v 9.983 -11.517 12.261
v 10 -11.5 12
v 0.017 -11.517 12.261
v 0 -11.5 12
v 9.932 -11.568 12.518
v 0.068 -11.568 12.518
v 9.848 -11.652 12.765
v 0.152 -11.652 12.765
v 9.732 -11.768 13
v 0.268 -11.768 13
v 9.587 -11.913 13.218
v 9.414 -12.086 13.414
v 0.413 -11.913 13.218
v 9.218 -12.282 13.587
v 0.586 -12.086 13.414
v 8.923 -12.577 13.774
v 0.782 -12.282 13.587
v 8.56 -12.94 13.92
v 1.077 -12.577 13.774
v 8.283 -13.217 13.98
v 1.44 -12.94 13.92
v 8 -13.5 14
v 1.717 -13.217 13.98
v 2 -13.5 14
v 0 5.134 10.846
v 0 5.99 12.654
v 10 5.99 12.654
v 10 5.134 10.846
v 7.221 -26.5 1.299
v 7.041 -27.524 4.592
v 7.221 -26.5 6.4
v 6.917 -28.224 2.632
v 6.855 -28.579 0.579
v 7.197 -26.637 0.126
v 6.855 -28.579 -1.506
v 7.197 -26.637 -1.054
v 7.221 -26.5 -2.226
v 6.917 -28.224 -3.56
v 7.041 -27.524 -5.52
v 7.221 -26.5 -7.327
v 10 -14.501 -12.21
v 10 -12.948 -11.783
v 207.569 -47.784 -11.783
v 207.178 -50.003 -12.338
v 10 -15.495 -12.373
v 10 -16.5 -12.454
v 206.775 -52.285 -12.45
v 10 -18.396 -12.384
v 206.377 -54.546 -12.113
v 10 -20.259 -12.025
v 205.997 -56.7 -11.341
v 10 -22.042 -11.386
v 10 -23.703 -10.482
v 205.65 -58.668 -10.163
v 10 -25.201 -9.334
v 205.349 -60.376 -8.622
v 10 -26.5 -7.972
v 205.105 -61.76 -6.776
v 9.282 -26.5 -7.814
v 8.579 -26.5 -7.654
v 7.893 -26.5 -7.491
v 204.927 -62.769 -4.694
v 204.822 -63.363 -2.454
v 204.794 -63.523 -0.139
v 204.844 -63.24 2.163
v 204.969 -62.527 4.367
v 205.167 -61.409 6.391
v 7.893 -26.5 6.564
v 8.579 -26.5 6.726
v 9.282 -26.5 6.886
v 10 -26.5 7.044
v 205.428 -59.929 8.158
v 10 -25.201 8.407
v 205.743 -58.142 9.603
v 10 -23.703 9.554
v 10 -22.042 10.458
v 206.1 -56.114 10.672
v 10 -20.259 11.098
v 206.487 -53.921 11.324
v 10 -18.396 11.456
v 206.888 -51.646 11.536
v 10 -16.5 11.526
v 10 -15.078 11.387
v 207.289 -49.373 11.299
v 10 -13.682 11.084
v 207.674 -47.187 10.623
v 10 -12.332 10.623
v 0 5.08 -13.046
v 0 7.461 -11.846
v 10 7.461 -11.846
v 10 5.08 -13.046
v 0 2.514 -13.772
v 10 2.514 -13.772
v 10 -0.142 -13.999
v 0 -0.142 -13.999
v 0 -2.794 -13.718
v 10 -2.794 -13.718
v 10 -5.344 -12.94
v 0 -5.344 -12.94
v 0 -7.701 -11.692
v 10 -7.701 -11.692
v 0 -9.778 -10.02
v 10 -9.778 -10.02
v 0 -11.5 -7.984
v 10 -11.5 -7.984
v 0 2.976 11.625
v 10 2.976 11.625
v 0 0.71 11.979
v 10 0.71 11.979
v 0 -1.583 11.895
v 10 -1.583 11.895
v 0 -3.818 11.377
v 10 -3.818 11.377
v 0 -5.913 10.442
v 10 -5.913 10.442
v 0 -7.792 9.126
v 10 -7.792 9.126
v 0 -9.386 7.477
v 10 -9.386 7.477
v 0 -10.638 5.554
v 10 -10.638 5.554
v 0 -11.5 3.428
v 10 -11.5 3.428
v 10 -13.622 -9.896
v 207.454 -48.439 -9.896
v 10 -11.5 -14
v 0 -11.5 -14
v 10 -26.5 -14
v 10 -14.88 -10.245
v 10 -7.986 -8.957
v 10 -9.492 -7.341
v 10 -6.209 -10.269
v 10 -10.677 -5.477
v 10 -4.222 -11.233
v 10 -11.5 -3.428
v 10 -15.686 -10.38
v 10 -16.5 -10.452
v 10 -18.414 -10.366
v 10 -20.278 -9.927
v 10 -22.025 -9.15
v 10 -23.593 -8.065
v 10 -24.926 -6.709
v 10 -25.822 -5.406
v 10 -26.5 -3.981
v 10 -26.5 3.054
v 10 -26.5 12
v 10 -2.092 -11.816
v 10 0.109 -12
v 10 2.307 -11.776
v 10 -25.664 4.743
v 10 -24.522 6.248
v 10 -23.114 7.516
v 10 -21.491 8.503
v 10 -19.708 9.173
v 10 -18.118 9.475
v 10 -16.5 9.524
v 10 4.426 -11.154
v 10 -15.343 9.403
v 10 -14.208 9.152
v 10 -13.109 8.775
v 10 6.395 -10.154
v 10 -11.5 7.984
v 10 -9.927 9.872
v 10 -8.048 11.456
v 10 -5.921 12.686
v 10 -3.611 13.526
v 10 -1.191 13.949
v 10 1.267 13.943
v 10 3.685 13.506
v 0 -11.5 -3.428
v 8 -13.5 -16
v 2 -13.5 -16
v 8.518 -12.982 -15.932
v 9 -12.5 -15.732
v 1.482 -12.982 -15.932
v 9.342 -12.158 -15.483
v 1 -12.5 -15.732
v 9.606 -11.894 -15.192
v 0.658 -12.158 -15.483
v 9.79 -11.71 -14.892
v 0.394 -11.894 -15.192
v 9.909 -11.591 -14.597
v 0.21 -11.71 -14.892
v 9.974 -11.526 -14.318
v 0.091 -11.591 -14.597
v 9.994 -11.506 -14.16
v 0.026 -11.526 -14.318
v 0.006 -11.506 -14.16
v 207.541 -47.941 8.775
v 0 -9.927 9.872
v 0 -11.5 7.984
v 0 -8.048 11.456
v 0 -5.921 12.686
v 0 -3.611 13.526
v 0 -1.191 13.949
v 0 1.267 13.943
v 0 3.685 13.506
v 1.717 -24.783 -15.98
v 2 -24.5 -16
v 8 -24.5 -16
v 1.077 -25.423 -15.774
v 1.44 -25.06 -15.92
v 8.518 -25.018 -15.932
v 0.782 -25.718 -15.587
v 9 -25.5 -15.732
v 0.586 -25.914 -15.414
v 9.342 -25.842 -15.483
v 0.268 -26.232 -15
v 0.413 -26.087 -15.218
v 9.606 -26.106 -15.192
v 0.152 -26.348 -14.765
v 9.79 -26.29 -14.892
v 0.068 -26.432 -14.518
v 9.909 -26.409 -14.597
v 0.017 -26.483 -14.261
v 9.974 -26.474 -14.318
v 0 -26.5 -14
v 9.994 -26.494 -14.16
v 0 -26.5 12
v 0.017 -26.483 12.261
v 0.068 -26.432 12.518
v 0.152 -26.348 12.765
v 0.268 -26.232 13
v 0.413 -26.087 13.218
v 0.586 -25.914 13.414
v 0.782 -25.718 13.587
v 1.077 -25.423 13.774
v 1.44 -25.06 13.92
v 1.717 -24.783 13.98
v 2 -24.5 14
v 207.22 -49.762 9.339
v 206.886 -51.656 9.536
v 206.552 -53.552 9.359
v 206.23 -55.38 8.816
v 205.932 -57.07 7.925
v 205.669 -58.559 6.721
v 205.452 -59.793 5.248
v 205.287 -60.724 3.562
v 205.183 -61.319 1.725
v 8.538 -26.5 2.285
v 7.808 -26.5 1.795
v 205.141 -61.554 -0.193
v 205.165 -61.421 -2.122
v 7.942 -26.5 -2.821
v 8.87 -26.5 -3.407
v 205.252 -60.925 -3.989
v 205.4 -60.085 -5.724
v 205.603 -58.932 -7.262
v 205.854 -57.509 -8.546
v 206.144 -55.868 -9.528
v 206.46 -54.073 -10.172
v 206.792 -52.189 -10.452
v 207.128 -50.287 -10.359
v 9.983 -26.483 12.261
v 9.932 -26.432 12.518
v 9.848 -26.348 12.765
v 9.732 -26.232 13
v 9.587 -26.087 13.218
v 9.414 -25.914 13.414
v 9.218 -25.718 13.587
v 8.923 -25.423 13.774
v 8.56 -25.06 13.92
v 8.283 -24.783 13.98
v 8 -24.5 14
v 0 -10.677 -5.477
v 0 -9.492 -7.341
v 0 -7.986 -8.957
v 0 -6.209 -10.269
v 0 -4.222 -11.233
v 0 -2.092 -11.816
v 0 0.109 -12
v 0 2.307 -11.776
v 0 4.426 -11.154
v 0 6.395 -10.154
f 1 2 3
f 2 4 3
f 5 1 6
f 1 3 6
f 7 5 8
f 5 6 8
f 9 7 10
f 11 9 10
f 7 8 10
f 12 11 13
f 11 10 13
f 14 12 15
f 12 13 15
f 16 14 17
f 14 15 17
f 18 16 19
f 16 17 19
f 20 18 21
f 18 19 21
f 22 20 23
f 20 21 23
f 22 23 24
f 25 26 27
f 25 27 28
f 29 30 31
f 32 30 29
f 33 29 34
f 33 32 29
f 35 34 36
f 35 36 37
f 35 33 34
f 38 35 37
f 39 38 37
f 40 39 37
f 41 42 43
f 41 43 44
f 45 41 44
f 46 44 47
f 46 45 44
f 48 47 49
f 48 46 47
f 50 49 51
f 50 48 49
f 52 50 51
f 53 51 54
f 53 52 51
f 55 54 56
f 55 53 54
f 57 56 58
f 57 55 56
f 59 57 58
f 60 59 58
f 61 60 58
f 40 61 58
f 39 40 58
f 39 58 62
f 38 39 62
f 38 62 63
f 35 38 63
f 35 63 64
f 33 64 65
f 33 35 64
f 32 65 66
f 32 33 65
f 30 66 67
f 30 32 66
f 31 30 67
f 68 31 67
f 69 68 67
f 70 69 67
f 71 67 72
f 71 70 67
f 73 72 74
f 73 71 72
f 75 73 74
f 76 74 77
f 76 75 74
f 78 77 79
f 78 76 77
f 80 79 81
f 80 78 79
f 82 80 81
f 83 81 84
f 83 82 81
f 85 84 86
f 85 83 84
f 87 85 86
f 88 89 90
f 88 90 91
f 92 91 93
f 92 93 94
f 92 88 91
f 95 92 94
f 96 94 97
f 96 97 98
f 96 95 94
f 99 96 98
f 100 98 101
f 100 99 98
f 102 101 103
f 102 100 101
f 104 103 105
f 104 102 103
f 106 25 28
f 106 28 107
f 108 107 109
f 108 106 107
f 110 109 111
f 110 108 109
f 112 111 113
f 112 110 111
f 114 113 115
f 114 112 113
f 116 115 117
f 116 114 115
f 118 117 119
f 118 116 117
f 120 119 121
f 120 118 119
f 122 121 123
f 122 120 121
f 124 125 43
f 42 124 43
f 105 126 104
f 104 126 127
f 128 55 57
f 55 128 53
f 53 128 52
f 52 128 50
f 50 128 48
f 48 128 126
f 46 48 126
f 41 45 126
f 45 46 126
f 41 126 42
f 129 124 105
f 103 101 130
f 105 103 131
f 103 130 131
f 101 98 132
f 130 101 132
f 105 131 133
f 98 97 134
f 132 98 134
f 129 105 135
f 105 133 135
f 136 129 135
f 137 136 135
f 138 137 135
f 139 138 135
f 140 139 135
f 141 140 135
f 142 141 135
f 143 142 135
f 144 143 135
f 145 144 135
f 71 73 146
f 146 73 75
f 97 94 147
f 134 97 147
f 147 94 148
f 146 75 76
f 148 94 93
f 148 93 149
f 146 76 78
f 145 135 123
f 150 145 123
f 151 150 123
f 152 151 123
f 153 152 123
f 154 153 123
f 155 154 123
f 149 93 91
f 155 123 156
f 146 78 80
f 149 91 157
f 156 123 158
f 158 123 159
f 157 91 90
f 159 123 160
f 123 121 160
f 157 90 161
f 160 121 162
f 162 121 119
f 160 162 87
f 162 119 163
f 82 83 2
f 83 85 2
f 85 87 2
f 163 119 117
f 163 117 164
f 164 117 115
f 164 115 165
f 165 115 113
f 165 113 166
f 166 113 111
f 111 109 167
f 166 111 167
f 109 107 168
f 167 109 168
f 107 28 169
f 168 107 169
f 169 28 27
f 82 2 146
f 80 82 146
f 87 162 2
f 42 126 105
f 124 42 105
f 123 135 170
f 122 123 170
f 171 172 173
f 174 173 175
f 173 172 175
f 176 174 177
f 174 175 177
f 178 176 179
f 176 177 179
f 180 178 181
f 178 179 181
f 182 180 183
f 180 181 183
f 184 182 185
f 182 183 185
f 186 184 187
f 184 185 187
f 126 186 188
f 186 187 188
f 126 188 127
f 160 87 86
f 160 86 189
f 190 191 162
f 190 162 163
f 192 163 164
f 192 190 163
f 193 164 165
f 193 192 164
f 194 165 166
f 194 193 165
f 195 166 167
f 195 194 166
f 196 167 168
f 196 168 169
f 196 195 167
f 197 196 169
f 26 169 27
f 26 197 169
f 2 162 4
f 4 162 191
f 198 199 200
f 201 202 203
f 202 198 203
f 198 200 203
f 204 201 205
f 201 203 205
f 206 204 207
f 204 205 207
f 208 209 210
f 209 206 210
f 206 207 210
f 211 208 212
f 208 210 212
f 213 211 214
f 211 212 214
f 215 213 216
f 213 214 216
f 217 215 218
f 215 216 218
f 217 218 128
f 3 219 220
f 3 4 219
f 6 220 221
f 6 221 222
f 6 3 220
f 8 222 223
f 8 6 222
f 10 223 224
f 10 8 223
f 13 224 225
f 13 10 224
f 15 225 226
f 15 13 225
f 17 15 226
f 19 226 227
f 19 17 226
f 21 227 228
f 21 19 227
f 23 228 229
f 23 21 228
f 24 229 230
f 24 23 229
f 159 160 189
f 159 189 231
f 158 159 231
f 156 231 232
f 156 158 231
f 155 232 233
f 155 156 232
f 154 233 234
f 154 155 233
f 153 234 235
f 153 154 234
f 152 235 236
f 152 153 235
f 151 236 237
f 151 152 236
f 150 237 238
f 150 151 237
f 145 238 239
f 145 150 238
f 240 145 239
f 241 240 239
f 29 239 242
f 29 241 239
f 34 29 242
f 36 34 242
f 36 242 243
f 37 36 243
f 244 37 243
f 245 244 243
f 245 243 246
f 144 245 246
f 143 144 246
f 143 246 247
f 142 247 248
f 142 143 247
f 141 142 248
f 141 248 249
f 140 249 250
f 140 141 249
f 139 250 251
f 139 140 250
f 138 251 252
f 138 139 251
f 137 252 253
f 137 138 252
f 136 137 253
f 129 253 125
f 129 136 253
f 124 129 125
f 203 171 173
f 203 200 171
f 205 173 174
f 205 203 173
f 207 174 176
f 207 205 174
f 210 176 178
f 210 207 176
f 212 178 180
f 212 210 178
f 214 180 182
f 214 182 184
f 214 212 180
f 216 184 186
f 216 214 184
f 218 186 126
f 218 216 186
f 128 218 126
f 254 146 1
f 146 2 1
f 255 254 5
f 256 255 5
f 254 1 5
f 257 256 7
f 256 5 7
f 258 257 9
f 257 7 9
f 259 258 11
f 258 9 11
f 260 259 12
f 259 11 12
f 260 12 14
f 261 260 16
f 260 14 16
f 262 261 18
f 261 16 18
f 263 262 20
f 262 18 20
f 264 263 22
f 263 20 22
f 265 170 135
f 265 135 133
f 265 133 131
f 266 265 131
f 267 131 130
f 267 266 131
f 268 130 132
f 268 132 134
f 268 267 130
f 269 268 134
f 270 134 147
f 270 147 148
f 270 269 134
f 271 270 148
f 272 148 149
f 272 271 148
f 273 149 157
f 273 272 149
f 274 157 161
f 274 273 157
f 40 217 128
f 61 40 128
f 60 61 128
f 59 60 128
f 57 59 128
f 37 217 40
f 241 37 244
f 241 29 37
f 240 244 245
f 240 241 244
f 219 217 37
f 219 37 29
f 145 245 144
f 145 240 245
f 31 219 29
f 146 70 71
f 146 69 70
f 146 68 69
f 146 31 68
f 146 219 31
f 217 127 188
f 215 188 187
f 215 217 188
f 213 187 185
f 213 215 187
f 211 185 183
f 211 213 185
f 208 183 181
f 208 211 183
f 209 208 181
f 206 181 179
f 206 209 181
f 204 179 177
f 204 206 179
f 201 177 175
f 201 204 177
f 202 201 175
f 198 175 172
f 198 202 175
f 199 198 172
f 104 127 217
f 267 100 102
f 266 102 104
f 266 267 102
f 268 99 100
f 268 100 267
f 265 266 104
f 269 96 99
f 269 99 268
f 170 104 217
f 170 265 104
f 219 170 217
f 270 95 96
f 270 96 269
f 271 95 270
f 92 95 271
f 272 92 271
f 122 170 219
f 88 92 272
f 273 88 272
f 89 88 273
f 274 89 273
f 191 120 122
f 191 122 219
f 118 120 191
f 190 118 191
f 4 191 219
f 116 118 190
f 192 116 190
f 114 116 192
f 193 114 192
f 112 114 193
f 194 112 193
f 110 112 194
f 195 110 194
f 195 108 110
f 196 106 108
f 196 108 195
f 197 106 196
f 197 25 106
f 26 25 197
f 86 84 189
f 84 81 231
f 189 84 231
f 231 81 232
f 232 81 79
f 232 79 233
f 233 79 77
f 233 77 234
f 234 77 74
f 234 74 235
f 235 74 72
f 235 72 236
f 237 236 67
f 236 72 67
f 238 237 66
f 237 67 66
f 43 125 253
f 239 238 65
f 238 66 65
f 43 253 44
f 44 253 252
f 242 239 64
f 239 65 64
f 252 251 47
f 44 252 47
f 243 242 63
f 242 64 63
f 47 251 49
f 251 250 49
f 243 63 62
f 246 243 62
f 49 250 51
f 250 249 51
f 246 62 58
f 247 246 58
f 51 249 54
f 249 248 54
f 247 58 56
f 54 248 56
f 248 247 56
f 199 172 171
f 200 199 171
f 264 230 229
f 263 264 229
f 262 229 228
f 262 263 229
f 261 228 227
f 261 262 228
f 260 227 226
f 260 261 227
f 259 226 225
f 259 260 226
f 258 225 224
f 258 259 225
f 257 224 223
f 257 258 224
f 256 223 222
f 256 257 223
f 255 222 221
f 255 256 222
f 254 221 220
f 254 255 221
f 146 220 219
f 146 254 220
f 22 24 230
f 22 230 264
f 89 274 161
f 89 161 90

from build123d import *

# Parameters (mm, degrees)
EXTRUDE_1_DEPTH      = 10
SKETCH_2_W           = 10
SKETCH_2_H           = 30
EXTRUDE_1_2_DEPTH    = 2.5
EXTRUDE_4_DEPTH      = 200
EXTRUDE_4_DEPTH_BACK = 1
SKETCH_8_W           = 10
SKETCH_8_H           = 30
EXTRUDE_2_DEPTH      = 10
FILLET_2_R           = 2


with BuildPart() as part:
    # 草图1 → Extrude 1 (new body)
    with BuildSketch(Plane(origin=(0, 0, 0), x_dir=(0, 0, -1), z_dir=(1, 0, 0))):
        with BuildLine():
            ThreePointArc((-10.846142842, 5.134314505), (0.719237504, -11.978426333), (10.153857158, 6.39524705))
            Line((10.153857158, 6.39524705), (11.846166684, 7.461121558))
            ThreePointArc((11.846166684, 7.461121558), (0.839110422, -13.974830722), (-12.653833316, 5.99003359))
            Line((-12.653833316, 5.99003359), (-10.846142842, 5.134314505))
        make_face()
    extrude(amount=EXTRUDE_1_DEPTH)

    # 草图2 → Extrude 1 2 (add, symmetric)
    with BuildSketch(Plane(origin=(0, -14, 0), x_dir=(-1, 0, 0), z_dir=(0, -1, 0))):
        with Locations((-5, 1)):
            Rectangle(SKETCH_2_W, SKETCH_2_H)
    extrude(amount=EXTRUDE_1_2_DEPTH, both=True)



with BuildPart() as body_2:
    # 草图6 → 拉伸-薄壁4 (new, two sides: drawn at the far end of the back side and taken through both)
    with BuildSketch(Plane(origin=(12.520129286, -2.207636595, 0), x_dir=(0, 0, 1), z_dir=(0.984807753012208, -0.17364817766693072, 0)).offset(-EXTRUDE_4_DEPTH_BACK)):
        with BuildLine():
            ThreePointArc((-11.782684324, 11.014511571), (-0.139277573, 26.995609574), (10.62288968, 10.40825987))
            Line((10.62288968, 10.40825987), (8.775098788, 11.173549892))
            ThreePointArc((8.775098788, 11.173549892), (-0.193373923, 24.996341312), (-9.896212883, 11.678759642))
            Line((-9.896212883, 11.678759642), (-11.782684324, 11.014511571))
        make_face()
    extrude(amount=EXTRUDE_4_DEPTH + EXTRUDE_4_DEPTH_BACK)


with BuildPart() as part_1:
    add(part.part)

    add(body_2.part)  # 凸台-拉伸2 merges body 2
    # 草图8 → 凸台-拉伸2 (add)
    with BuildSketch(Plane.XZ.offset(16.5)):
        with Locations((5, -1)):
            Rectangle(SKETCH_8_W, SKETCH_8_H)
    extrude(amount=EXTRUDE_2_DEPTH)

    # 圆角2
    fillet_2_edges = [part_1.edges().sort_by_distance(p)[0] for p in [
        (10, -19, -16),
        (5, -11.5, 14),
        (10, -19, 14),
        (0, -19, 14),
        (5, -11.5, -16),
        (0, -19, -16),
        (5, -26.5, -16),
        (5, -26.5, 14),
    ]]
    fillet(fillet_2_edges, radius=FILLET_2_R)


solid = part_1.part
